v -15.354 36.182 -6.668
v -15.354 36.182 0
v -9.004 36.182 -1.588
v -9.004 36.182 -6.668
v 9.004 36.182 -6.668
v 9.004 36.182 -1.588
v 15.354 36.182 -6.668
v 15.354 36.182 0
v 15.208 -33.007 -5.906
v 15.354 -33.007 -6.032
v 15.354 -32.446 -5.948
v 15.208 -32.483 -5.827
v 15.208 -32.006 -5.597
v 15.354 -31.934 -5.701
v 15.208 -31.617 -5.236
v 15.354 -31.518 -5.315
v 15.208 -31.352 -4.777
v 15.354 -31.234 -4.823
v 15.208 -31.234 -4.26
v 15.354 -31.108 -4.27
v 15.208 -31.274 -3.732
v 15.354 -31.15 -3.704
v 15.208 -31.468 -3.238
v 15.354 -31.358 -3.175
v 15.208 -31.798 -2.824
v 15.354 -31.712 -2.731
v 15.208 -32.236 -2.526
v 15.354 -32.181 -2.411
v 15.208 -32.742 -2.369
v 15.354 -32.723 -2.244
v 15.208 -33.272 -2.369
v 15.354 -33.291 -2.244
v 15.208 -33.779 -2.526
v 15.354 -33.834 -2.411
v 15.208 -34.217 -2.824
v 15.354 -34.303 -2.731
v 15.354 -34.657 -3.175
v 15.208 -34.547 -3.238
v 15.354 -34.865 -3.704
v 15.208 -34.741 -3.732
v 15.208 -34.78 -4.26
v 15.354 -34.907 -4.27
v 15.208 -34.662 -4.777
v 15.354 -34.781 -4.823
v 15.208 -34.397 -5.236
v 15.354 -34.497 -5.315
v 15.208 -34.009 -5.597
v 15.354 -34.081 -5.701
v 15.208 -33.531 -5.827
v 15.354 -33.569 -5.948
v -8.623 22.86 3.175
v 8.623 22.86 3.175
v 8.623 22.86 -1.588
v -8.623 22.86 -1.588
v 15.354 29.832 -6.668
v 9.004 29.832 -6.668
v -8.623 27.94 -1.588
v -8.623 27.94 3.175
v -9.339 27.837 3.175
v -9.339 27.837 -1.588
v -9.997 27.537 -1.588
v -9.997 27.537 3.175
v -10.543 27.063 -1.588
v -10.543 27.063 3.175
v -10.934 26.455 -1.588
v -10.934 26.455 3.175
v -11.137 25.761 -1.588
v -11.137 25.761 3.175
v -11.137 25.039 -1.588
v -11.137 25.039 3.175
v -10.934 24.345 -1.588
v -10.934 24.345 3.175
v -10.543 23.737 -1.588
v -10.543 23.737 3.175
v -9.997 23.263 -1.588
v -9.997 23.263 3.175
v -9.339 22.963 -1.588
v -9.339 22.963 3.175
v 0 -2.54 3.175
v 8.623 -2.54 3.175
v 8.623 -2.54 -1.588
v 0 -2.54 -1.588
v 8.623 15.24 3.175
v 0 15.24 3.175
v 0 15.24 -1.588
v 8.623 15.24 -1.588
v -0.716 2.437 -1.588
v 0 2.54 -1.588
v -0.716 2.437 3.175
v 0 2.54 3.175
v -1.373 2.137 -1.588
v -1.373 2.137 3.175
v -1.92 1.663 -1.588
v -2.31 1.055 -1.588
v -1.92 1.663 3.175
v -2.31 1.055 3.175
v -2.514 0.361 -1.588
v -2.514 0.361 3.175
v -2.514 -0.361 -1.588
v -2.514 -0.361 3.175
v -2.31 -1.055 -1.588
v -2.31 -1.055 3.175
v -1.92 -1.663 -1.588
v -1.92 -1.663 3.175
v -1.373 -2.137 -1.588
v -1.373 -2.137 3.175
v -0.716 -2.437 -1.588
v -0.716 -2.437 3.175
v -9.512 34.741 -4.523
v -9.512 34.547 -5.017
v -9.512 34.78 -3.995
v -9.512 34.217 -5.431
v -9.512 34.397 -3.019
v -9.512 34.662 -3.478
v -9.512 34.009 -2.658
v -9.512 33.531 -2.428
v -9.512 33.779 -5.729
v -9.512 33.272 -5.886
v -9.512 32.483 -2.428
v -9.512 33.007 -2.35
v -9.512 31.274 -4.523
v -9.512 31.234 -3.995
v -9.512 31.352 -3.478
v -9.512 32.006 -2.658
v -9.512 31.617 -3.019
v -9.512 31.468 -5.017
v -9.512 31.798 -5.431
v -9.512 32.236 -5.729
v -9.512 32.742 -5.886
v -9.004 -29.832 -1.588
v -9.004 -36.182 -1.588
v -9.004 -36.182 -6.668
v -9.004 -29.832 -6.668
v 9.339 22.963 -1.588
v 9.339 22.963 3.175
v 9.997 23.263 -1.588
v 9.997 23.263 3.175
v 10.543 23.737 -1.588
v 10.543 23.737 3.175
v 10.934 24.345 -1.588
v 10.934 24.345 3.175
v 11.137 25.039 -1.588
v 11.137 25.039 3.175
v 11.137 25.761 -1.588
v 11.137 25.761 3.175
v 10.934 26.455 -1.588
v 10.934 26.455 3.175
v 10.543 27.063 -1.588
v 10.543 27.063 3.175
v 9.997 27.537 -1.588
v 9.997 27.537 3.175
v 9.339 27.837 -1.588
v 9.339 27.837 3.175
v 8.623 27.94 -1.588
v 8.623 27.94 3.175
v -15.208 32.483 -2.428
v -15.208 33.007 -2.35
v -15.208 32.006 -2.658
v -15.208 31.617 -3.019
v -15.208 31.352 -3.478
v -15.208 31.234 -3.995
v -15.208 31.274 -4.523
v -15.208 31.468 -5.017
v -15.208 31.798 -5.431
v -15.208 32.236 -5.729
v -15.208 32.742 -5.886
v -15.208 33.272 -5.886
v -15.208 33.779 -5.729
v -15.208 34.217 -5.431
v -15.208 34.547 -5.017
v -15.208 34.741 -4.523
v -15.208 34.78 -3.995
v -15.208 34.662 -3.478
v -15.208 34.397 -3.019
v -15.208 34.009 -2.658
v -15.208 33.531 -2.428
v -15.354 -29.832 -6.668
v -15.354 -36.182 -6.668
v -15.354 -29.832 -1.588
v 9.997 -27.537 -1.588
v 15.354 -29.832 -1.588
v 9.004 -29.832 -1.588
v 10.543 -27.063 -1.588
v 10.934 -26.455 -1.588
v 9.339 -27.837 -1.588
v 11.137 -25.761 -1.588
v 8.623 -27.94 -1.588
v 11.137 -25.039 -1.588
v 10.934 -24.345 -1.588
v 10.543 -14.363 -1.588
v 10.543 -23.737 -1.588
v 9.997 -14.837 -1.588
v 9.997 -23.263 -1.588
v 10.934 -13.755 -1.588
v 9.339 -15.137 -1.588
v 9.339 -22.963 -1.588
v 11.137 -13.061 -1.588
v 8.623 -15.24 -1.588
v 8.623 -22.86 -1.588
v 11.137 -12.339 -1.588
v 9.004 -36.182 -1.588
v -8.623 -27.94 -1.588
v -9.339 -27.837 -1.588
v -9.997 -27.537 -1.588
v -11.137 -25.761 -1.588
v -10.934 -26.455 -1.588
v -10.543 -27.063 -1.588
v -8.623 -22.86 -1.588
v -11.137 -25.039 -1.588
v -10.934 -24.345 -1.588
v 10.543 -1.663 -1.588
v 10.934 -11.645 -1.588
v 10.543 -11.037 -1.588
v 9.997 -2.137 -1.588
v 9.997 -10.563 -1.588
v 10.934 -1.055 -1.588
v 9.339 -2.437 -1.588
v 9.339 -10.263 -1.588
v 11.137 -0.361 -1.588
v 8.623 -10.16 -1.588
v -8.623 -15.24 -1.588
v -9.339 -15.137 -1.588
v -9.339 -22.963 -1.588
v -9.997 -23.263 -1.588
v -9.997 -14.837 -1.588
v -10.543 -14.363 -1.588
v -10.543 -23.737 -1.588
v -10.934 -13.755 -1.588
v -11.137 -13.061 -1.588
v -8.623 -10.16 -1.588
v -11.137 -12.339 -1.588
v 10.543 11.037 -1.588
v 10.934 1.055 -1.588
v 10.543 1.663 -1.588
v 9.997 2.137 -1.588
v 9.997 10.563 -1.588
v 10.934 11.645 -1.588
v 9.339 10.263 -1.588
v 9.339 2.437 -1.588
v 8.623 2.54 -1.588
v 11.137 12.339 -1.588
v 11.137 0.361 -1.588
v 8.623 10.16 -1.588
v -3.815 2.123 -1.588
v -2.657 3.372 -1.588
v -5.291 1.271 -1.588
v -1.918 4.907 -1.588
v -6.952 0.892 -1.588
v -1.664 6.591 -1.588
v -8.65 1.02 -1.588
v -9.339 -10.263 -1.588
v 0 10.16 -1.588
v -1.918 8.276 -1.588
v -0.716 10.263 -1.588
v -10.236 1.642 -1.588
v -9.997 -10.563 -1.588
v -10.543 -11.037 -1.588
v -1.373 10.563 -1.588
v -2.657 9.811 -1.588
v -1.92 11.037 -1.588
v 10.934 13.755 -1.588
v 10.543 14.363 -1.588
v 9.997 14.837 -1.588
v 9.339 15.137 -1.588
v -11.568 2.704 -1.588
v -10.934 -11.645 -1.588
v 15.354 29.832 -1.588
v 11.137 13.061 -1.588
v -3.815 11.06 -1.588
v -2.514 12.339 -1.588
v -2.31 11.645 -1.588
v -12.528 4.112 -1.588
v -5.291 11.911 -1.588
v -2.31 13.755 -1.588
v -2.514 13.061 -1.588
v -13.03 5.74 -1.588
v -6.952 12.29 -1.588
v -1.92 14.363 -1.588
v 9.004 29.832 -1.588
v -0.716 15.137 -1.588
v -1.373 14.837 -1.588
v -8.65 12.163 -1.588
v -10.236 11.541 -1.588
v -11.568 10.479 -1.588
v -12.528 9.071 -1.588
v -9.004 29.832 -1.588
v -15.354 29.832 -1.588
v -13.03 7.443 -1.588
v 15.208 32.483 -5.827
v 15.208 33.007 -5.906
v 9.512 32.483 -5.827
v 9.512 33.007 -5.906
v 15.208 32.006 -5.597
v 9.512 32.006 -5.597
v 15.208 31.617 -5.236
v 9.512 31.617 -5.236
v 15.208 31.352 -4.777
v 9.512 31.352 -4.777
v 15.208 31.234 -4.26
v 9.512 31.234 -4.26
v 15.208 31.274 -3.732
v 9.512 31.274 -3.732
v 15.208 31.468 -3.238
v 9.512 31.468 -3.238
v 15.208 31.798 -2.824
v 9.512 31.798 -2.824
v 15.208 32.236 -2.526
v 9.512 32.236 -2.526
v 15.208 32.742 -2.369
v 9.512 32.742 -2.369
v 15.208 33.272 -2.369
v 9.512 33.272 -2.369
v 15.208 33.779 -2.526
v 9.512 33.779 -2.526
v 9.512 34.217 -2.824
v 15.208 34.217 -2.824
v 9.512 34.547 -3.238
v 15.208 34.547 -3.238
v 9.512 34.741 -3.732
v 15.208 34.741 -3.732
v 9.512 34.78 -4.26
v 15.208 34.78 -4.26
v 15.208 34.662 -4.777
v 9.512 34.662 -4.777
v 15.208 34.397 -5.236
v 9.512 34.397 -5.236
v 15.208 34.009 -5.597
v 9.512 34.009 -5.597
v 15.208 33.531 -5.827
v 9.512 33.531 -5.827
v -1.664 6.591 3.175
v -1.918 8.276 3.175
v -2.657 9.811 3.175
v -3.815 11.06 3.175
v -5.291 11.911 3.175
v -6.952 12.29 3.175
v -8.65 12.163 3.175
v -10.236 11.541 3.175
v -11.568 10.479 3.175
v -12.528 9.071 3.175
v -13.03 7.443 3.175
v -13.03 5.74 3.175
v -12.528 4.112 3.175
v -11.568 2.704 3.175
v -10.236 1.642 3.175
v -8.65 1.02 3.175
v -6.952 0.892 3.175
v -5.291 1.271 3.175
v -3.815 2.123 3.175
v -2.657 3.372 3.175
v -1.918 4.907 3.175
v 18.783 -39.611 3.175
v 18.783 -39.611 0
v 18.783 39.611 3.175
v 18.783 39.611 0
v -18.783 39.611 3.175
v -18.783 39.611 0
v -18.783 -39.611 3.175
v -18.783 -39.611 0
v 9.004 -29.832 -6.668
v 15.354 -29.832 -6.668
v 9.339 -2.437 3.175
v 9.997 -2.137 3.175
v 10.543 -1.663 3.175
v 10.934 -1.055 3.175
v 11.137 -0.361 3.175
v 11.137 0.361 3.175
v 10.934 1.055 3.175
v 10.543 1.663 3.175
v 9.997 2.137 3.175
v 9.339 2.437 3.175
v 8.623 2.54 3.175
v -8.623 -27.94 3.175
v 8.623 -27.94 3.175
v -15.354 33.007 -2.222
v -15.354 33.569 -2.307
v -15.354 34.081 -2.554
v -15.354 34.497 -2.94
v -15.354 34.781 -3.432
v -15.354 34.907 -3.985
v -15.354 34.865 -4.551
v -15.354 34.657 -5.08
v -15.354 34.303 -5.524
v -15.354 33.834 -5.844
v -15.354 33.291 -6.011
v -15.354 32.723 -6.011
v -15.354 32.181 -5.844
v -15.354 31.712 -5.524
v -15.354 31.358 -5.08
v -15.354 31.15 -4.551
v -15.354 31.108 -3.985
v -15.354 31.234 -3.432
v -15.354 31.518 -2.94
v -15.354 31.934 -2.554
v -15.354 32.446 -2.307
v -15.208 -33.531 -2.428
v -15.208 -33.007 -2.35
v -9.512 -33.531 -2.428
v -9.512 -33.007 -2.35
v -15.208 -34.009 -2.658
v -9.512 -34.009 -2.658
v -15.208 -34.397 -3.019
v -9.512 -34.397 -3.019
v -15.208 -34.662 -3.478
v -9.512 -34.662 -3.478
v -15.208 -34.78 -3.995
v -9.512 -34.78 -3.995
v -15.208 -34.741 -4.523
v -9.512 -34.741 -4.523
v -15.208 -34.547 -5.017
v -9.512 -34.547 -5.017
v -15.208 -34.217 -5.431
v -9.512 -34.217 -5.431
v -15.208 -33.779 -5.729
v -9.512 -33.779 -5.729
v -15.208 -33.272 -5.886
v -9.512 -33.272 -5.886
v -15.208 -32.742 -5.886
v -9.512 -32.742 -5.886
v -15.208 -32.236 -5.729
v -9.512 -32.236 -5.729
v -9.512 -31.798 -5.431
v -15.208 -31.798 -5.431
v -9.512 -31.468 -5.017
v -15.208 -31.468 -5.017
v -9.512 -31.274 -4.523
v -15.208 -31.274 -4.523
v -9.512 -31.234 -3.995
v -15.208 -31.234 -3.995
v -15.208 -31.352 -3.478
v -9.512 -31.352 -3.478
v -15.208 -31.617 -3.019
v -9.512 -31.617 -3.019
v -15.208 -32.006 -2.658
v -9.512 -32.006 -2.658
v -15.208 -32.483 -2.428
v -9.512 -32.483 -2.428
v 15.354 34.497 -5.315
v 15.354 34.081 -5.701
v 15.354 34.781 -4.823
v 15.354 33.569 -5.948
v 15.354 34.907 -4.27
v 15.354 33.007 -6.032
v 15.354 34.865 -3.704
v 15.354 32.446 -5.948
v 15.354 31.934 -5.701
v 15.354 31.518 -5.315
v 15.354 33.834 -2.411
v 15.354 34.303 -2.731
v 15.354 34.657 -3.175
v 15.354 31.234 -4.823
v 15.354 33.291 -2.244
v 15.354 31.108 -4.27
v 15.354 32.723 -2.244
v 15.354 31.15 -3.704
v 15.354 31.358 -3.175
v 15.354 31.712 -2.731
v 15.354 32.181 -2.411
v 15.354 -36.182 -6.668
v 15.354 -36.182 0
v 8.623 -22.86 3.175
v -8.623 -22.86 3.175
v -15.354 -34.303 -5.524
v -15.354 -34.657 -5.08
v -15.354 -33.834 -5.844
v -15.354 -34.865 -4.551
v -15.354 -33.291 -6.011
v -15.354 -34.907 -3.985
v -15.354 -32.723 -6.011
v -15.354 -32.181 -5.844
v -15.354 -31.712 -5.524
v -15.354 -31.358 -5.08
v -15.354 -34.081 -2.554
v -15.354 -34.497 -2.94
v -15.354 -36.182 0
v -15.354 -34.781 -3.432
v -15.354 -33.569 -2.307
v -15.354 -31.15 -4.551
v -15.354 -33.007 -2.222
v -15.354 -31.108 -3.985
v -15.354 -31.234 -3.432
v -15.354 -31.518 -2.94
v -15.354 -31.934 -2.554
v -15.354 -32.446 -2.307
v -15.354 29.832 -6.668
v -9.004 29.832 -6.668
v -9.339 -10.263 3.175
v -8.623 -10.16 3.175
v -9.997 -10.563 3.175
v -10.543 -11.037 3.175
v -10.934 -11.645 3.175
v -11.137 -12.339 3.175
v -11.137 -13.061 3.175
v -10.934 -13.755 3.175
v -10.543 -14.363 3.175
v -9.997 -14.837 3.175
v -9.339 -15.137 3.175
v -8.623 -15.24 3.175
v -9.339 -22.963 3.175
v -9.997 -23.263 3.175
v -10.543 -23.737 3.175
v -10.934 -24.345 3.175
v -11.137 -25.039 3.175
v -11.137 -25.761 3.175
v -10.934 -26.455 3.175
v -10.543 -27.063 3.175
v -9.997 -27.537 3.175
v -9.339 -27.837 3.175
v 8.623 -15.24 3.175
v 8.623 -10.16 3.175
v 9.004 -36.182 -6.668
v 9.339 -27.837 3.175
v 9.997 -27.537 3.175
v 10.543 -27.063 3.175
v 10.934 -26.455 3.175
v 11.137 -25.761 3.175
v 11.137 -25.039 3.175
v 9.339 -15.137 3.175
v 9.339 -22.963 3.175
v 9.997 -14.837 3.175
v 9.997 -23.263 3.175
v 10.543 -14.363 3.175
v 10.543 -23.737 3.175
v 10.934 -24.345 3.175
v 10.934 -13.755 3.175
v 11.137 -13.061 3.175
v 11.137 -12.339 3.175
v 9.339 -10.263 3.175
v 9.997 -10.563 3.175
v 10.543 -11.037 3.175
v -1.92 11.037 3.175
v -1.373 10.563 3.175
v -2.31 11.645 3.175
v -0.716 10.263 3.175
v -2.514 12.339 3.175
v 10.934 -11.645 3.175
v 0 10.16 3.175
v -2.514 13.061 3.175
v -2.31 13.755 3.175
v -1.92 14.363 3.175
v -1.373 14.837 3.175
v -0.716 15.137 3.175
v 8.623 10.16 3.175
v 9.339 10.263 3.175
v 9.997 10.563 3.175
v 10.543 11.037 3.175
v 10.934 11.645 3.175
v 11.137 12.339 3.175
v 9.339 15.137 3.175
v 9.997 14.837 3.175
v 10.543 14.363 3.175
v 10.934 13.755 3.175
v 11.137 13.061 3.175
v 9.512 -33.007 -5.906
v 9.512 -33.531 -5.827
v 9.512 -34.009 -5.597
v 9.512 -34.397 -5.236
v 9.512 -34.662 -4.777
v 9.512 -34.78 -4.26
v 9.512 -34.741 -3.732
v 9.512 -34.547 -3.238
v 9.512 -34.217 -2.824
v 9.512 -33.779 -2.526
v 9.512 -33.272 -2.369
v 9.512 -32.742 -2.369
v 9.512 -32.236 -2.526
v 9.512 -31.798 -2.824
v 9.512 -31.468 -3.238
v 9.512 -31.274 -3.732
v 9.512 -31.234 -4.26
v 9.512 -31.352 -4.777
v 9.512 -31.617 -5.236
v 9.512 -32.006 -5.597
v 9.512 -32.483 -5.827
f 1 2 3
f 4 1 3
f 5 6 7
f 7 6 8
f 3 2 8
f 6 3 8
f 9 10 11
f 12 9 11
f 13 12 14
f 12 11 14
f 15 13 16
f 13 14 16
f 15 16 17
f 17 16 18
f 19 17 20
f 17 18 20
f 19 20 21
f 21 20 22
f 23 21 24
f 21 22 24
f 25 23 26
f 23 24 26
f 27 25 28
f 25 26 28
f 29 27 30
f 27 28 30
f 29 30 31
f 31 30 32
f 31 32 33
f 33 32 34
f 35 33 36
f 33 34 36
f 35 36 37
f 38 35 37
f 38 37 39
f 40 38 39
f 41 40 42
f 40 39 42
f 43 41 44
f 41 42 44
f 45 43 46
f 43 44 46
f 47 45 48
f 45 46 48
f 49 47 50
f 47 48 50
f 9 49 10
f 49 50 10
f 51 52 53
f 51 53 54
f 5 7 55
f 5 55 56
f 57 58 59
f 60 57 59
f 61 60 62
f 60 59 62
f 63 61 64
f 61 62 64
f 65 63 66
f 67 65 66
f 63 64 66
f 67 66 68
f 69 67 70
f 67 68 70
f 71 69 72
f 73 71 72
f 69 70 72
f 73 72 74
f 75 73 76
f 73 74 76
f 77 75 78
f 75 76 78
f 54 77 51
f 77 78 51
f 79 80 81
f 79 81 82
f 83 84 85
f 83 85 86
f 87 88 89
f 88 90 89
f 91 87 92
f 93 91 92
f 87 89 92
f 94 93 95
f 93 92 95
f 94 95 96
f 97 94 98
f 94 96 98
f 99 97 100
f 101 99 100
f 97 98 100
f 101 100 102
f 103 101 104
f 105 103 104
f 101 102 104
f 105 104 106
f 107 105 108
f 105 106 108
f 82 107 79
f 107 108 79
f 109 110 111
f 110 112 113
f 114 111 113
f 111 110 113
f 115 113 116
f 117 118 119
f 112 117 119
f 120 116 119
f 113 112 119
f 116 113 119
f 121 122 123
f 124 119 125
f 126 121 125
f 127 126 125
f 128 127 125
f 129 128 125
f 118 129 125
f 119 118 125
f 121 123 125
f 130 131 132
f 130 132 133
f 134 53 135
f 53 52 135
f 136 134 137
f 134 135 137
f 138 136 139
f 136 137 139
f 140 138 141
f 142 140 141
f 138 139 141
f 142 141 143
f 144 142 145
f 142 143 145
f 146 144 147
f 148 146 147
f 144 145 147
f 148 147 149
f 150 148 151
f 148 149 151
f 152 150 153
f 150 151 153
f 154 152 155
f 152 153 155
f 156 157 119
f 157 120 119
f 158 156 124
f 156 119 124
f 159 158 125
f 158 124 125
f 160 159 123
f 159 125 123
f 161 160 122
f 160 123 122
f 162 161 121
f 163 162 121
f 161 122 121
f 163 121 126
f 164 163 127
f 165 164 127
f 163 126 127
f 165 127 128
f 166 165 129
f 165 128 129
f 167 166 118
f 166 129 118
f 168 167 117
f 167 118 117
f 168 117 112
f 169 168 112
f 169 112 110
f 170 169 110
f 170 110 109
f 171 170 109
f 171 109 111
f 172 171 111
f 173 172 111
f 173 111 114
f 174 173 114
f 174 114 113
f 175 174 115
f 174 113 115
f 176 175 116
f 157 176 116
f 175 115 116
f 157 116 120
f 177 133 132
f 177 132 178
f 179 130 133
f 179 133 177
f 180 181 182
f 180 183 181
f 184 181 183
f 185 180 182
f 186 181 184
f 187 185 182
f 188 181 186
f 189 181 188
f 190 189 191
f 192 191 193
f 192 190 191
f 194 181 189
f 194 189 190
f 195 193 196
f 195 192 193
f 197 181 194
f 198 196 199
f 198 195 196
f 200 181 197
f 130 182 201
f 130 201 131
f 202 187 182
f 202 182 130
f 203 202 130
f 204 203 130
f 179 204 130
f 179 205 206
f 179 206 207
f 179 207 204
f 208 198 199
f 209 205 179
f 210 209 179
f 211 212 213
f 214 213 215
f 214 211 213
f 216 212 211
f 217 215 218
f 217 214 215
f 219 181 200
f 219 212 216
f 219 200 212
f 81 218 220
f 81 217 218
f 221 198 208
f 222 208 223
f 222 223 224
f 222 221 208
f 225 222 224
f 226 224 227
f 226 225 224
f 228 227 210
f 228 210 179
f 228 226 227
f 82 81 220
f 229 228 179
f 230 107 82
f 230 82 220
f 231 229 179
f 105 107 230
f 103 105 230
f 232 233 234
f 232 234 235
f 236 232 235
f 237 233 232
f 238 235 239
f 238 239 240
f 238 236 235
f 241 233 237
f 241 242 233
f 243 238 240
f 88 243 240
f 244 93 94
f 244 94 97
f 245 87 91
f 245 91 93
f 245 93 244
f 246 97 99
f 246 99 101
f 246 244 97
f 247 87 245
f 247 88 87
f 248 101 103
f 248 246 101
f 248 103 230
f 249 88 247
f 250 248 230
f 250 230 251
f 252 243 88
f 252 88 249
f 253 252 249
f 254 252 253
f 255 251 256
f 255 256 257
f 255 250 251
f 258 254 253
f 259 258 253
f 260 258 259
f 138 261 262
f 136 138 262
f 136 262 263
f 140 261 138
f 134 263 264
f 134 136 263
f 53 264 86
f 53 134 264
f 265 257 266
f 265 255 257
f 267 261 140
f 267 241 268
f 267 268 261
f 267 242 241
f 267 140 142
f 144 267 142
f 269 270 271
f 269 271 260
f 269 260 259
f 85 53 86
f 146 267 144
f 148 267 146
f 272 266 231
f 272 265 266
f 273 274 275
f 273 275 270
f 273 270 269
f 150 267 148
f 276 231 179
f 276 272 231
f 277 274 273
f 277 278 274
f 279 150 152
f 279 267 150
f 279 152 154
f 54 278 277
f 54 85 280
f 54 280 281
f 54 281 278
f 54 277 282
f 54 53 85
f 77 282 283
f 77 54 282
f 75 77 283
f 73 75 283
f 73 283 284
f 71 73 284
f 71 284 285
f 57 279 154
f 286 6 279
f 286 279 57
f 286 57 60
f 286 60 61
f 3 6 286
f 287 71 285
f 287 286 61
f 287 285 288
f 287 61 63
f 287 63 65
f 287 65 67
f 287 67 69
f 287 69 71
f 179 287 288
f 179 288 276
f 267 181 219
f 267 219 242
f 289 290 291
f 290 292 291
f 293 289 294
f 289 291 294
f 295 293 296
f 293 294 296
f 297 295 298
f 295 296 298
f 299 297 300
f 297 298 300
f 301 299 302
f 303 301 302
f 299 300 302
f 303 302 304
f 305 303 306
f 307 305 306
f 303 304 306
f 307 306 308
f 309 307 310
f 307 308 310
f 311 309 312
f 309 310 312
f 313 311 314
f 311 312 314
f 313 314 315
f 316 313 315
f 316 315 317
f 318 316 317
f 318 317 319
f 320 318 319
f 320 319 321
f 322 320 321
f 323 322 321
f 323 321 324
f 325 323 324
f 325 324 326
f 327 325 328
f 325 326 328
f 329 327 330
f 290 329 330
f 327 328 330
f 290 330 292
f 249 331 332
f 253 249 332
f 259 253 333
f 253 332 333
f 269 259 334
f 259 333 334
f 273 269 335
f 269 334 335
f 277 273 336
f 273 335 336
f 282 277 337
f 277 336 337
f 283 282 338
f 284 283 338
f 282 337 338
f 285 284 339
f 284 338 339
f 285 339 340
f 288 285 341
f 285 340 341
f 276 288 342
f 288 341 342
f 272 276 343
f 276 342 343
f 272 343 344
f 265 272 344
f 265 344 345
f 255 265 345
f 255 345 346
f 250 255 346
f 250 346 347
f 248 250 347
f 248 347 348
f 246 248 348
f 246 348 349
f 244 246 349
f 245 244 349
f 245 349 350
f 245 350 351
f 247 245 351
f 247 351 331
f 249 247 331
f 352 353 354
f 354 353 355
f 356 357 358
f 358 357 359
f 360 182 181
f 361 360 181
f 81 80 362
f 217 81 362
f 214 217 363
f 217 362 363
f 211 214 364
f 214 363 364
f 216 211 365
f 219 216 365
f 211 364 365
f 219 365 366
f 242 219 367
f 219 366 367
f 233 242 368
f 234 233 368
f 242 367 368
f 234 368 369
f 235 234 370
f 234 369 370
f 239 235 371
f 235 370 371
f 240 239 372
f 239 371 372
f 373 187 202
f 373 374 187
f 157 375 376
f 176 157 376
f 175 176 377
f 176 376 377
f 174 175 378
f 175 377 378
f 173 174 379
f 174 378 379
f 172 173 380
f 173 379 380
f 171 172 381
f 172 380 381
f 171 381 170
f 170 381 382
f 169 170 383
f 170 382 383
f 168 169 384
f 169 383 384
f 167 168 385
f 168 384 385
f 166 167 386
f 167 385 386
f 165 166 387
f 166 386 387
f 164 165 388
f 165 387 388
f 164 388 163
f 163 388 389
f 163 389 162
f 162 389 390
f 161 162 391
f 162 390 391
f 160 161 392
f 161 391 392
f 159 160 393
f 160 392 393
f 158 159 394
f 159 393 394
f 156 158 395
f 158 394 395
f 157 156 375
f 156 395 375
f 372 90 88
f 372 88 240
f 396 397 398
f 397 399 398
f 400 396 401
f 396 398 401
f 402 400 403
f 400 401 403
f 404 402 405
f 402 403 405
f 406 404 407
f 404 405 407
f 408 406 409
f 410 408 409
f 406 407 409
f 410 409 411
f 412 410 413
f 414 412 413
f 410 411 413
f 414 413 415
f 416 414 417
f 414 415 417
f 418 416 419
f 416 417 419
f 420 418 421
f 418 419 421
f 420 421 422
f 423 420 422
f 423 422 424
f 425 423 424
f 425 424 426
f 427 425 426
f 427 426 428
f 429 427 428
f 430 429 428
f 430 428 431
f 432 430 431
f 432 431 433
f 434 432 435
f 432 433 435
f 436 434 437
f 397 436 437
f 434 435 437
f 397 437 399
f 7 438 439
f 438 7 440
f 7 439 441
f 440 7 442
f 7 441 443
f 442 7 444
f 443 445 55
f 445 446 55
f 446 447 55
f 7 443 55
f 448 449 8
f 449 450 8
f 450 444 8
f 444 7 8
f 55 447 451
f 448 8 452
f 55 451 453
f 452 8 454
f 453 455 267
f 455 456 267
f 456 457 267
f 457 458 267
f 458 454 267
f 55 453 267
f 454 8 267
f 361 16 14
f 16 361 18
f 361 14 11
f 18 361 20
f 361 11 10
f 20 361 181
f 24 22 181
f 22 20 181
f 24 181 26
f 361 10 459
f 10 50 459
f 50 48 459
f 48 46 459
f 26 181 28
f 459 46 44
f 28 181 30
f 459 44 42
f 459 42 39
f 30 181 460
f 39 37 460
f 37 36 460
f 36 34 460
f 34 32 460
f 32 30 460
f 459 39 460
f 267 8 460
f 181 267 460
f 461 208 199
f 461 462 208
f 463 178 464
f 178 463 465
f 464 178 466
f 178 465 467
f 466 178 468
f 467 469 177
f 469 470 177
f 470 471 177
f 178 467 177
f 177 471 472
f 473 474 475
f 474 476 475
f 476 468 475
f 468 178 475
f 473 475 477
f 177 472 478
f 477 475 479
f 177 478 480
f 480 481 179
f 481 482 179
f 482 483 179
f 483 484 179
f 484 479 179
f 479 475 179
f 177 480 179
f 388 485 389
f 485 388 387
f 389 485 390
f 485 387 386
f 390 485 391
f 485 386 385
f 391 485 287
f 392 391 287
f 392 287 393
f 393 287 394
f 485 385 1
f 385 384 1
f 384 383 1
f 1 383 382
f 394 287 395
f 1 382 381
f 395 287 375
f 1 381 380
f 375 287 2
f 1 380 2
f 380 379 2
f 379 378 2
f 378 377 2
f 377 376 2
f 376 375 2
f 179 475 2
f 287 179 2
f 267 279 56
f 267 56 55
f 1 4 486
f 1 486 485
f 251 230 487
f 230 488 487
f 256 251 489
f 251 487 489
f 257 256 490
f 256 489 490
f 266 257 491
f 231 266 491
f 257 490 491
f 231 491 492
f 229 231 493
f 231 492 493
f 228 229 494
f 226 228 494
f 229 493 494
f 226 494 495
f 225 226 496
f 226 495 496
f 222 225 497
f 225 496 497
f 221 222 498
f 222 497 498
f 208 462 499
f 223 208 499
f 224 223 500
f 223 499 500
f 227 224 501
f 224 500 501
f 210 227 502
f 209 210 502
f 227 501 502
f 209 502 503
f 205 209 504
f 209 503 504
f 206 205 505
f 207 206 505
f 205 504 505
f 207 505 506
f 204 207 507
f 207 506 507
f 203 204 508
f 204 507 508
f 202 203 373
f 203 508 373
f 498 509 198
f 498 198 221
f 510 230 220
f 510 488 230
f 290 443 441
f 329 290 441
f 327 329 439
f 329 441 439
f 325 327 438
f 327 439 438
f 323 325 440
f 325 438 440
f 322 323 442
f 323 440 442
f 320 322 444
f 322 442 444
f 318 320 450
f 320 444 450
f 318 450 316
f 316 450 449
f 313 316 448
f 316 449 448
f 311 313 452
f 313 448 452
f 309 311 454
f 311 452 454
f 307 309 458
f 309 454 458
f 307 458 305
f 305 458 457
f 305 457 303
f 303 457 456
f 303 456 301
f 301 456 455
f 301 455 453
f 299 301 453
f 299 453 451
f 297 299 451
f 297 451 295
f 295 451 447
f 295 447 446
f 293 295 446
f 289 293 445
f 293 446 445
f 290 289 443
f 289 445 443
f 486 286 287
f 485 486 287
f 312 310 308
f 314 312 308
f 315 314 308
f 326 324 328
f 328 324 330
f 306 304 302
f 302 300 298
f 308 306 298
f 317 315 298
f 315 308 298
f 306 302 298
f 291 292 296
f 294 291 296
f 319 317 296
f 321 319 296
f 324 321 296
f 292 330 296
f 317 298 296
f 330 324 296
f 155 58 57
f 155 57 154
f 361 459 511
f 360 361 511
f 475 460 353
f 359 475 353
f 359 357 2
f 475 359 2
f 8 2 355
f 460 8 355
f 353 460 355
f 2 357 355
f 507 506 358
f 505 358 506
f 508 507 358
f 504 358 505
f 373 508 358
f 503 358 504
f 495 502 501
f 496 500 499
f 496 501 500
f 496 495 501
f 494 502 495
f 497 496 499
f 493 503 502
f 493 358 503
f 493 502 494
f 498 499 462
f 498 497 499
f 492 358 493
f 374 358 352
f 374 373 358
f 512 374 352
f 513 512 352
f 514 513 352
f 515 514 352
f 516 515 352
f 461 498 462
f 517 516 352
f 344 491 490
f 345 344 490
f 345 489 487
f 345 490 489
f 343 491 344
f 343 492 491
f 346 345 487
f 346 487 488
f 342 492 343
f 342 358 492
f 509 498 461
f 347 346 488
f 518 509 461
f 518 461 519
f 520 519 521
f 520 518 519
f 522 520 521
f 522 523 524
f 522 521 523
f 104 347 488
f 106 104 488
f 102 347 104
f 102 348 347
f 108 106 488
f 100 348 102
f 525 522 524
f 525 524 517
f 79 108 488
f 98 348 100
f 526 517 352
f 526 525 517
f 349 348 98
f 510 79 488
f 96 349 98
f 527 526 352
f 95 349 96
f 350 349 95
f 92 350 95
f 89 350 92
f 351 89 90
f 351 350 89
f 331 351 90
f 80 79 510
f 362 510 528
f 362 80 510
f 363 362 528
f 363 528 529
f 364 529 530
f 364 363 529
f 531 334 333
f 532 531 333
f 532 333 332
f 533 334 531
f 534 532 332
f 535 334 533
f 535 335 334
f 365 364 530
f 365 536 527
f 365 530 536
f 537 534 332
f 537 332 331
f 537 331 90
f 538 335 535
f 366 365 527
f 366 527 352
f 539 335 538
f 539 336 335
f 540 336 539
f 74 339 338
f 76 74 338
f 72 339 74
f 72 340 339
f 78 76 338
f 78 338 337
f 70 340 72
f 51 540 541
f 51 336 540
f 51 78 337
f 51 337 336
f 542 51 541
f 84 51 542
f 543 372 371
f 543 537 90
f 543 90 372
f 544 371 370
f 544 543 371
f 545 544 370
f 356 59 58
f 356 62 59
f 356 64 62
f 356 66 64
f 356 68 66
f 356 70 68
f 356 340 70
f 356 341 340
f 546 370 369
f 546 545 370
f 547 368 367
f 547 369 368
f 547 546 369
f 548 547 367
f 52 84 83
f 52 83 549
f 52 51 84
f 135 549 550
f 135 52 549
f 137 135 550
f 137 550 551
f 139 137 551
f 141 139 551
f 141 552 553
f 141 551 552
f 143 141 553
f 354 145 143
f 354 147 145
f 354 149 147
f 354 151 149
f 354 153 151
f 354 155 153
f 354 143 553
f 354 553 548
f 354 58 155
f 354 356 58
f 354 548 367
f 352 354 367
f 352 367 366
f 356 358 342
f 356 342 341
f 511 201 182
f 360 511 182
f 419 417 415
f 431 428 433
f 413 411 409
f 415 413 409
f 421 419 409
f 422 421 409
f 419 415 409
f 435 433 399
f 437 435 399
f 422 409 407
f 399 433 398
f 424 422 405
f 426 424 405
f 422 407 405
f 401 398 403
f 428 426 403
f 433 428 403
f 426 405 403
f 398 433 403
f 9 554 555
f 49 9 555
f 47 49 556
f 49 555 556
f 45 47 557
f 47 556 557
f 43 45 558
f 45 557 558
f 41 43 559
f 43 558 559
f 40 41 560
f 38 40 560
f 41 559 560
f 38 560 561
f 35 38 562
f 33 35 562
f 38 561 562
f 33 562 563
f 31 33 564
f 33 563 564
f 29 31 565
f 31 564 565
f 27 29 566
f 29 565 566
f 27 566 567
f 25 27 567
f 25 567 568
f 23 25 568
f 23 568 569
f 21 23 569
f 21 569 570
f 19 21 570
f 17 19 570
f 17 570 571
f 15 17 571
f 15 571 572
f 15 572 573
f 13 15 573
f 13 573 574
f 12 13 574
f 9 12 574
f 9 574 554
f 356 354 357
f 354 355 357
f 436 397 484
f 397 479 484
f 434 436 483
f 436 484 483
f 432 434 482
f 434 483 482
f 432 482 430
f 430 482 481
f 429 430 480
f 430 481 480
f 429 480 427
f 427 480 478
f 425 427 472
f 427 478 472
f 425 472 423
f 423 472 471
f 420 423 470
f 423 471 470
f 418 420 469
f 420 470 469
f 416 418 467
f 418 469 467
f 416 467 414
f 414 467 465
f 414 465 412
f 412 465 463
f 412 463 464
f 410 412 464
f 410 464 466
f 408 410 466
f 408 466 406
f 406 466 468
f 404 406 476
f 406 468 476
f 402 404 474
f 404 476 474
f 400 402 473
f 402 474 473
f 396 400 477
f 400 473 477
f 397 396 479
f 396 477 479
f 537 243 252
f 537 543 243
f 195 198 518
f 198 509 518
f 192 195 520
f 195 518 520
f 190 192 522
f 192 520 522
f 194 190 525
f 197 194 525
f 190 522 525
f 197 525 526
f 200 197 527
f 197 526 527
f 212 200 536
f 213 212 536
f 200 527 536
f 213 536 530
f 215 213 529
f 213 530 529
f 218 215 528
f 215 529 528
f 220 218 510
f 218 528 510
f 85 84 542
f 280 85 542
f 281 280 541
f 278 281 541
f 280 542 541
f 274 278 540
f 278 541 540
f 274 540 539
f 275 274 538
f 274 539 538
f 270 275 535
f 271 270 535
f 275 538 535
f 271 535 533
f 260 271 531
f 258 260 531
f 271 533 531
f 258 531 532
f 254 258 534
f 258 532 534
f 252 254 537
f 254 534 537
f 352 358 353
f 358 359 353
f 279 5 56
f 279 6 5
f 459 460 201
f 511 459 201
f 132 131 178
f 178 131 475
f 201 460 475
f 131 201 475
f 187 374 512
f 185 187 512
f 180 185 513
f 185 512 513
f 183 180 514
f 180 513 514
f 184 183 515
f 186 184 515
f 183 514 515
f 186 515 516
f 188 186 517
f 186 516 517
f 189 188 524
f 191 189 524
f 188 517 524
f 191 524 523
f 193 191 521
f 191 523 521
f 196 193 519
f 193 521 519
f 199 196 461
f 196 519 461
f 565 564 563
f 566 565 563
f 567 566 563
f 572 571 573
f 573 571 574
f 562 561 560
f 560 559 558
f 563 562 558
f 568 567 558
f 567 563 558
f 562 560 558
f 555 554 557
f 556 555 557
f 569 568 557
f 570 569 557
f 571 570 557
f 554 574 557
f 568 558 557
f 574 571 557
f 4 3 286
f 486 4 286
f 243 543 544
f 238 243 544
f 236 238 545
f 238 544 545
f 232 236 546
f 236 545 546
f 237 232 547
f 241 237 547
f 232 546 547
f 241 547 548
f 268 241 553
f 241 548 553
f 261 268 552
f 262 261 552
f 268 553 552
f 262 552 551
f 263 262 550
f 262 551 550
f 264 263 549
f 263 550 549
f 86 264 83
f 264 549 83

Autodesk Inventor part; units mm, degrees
ref_plane "YZ Plane" through (0, 0, 0) normal (1, 0, 0) x (0, 1, 0)
ref_plane "XZ Plane" through (0, 0, 0) normal (0, 1, 0) x (-1, 0, 0)
ref_plane "XY Plane" through (0, 0, 0) normal (0, 0, 1) x (1, 0, 0)
sketch "Sketch1" plane through (0, 0, 0) normal (0, 0, 1) x (1, 0, 0)
  line L0 (-18.7833, 39.6114) -> (-18.7833, -39.6114) projected
  line L1 (-18.7833, -39.6114) -> (18.7833, -39.6114) projected
  line L2 (18.7833, -39.6114) -> (18.7833, 39.6114) projected
  line L3 (18.7833, 39.6114) -> (-18.7833, 39.6114) projected
  line L4 (-15.6083, 36.4364) -> (15.6083, 36.4364) projected
  line L5 (15.6083, 36.4364) -> (15.6083, -36.4364) projected
  line L6 (15.6083, -36.4364) -> (-15.6083, -36.4364) projected
  line L7 (-15.6083, -36.4364) -> (-15.6083, 36.4364) projected
  point P0 (0, 0)
extrude "Extrusion1" add sketch "Sketch1" along normal blind 3.175 contours L3 L2 L1 L0 | L4 L5 L6 L7
sketch "Sketch2" plane through (0, 0, 0) normal (0, 0, -1) x (-1, 0, 0)
  line L0 (-15.6083, -36.4364) -> (15.6083, -36.4364) projected
  line L1 (-15.6083, 36.4364) -> (-15.6083, -36.4364) projected
  line L2 (15.6083, 36.4364) -> (-15.6083, 36.4364) projected
  line L3 (15.6083, -36.4364) -> (15.6083, 36.4364) projected
  line L4 (-15.3543, 36.1824) -> (-15.3543, -36.1824)
  line L5 (-15.3543, -36.1824) -> (15.3543, -36.1824)
  line L6 (15.3543, -36.1824) -> (15.3543, 36.1824)
  line L7 (15.3543, 36.1824) -> (-15.3543, 36.1824)
  point P0 (0, 0)
  dimension "d2" = 0.254
extrude "Extrusion2" add sketch "Sketch2" along normal blind 1.5875 contours L7 L6 L5 L4
sketch "Sketch3" plane through (0, 0, -1.5875) normal (0, 0, -1) x (-1, 0, 0)
  line L0 (-15.3543, 36.1824) -> (-15.3543, -36.1824) projected
  line L1 (-15.3543, 36.1824) -> (-9.0043, 36.1824)
  line L2 (-9.0043, 36.1824) -> (-9.0043, 29.8324)
  line L3 (-9.0043, 29.8324) -> (-15.3543, 29.8324)
  line L4 (-15.3543, 29.8324) -> (-15.3543, 36.1824)
  line L5 (15.3543, 36.1824) -> (-15.3543, 36.1824) projected
  line L6 (15.3543, 36.1824) -> (9.0043, 36.1824)
  line L7 (9.0043, 36.1824) -> (9.0043, 29.8324)
  line L8 (9.0043, 29.8324) -> (15.3543, 29.8324)
  line L9 (15.3543, 29.8324) -> (15.3543, 36.1824)
  line L10 (-15.3543, -36.1824) -> (15.3543, -36.1824) projected
  line L11 (-15.3543, -36.1824) -> (-9.0043, -36.1824)
  line L12 (-9.0043, -36.1824) -> (-9.0043, -29.8324)
  line L13 (-9.0043, -29.8324) -> (-15.3543, -29.8324)
  line L14 (-15.3543, -29.8324) -> (-15.3543, -36.1824)
  line L15 (15.3543, 36.1824) -> (15.3543, -36.1824) projected
  line L16 (15.3543, -36.1824) -> (9.0043, -36.1824)
  line L17 (9.0043, -36.1824) -> (9.0043, -29.8324)
  line L18 (9.0043, -29.8324) -> (15.3543, -29.8324)
  line L19 (15.3543, -29.8324) -> (15.3543, -36.1824)
  point P0 (0, 0)
  dimension "d5" = 6.35
  dimension "d6" = 6.35
  dimension "d7" = 6.35
  dimension "d8" = 6.35
  dimension "d9" = 6.35
  dimension "d10" = 6.35
  dimension "d11" = 6.35
  dimension "d12" = 6.35
extrude "Extrusion3" add sketch "Sketch3" along normal blind 5.08 contours L1 L2 L3 L0 | L13 L12 L10 L0 | L5 L9 L8 L7 | L17 L18 L15 L10
sketch "Sketch4" plane through (15.3543, -36.1824, 0) normal (1, 0, 0) x (0, 0, -1)
  line L0 (6.6675, 66.0147) -> (6.6675, 72.3647) projected
  line L1 (0, 72.3647) -> (0, 0) projected
  line L2 (6.6675, 0) -> (6.6675, 6.35) projected
  line L3 (1.5875, 66.0147) -> (1.5875, 6.35) projected
  line L4 (0, 72.3647) -> (6.6675, 72.3647) projected
  line L5 (1.5875, 6.35) -> (6.6675, 6.35) projected
  line L6 (6.6675, 6.35) -> (6.6675, 0) projected
  line L7 (1.5875, 6.35) -> (6.6675, 0)
  line L8 (1.5875, 66.0147) -> (6.6675, 72.3647)
  point P0 (0, 36.1824)
  point P1 (4.1275, 3.175)
  point P2 (4.1275, 69.1897)
  point P3 (4.1275, 3.175)
  point P4 (4.1275, 69.1897)
sketch "Sketch5" plane through (-15.3543, -36.1824, 0) normal (-1, 0, 0) x (0, 0, 1)
  point P0 (0, 36.1824)
  point P1 (-4.1275, 69.1897)
  point P2 (-4.1275, 3.175)
hole "Hole1" at (15.3543, 33.0074, -4.1275) at (15.3543, -33.0074, -4.1275) direction (-1, 0, 0) diameter 3.556 depth 5.842 countersink diameter 3.81 countersink angle 82
hole "Hole2" at (-15.3543, 33.0074, -4.1275) at (-15.3543, -33.0074, -4.1275) direction (1, 0, 0) diameter 3.556 depth 5.842 countersink diameter 3.81 countersink angle 82
sketch "Sketch6" plane through (0, 0, 3.175) normal (0, 0, 1) x (1, 0, 0)
  line L0 (-8.6233, 0) -> (8.6233, 0) construction
  line L1 (-8.6233, 2.54) -> (8.6233, 2.54)
  line L2 (8.6233, -2.54) -> (-8.6233, -2.54)
  arc A0 (-8.6233, 2.54) -> (-8.6233, -2.54) centre (-8.6233, 0) ccw
  arc A1 (8.6233, -2.54) -> (8.6233, 2.54) centre (8.6233, 0) ccw
  line L3 (-18.7833, 39.6114) -> (-18.7833, -39.6114) projected
  line L4 (18.7833, -39.6114) -> (18.7833, 39.6114) projected
  line L5 (-18.7833, -39.6114) -> (18.7833, -39.6114) projected
  arc A2 (8.6233, 10.16) -> (8.6233, 15.24) centre (8.6233, 12.7) ccw
  line L6 (-8.6233, 15.24) -> (8.6233, 15.24)
  line L7 (8.6233, 10.16) -> (-8.6233, 10.16)
  arc A3 (-8.6233, 15.24) -> (-8.6233, 10.16) centre (-8.6233, 12.7) ccw
  arc A4 (8.6233, 22.86) -> (8.6233, 27.94) centre (8.6233, 25.4) ccw
  line L8 (-8.6233, 27.94) -> (8.6233, 27.94)
  line L9 (8.6233, 22.86) -> (-8.6233, 22.86)
  arc A5 (-8.6233, 27.94) -> (-8.6233, 22.86) centre (-8.6233, 25.4) ccw
  arc A6 (8.6233, -15.24) -> (8.6233, -10.16) centre (8.6233, -12.7) ccw
  line L10 (-8.6233, -10.16) -> (8.6233, -10.16)
  line L11 (8.6233, -15.24) -> (-8.6233, -15.24)
  arc A7 (-8.6233, -10.16) -> (-8.6233, -15.24) centre (-8.6233, -12.7) ccw
  arc A8 (8.6233, -2.54) -> (8.6233, 2.54) centre (8.6233, 0) ccw
  line L12 (-8.6233, 2.54) -> (8.6233, 2.54)
  line L13 (8.6233, -2.54) -> (-8.6233, -2.54)
  arc A9 (-8.6233, 2.54) -> (-8.6233, -2.54) centre (-8.6233, 0) ccw
  arc A10 (8.6233, 10.16) -> (8.6233, 15.24) centre (8.6233, 12.7) ccw
  line L14 (-8.6233, 15.24) -> (8.6233, 15.24)
  line L15 (8.6233, 10.16) -> (-8.6233, 10.16)
  arc A11 (-8.6233, 15.24) -> (-8.6233, 10.16) centre (-8.6233, 12.7) ccw
  arc A12 (8.6233, -27.94) -> (8.6233, -22.86) centre (8.6233, -25.4) ccw
  line L16 (-8.6233, -22.86) -> (8.6233, -22.86)
  line L17 (8.6233, -27.94) -> (-8.6233, -27.94)
  arc A13 (-8.6233, -22.86) -> (-8.6233, -27.94) centre (-8.6233, -25.4) ccw
  arc A14 (8.6233, -15.24) -> (8.6233, -10.16) centre (8.6233, -12.7) ccw
  line L18 (-8.6233, -10.16) -> (8.6233, -10.16)
  line L19 (8.6233, -15.24) -> (-8.6233, -15.24)
  arc A15 (-8.6233, -10.16) -> (-8.6233, -15.24) centre (-8.6233, -12.7) ccw
  arc A16 (8.6233, -2.54) -> (8.6233, 2.54) centre (8.6233, 0) ccw
  line L20 (-8.6233, 2.54) -> (8.6233, 2.54)
  line L21 (8.6233, -2.54) -> (-8.6233, -2.54)
  arc A17 (-8.6233, 2.54) -> (-8.6233, -2.54) centre (-8.6233, 0) ccw
  circle A18 centre (0, 12.7) radius 2.54
  circle A19 centre (0, 0) radius 2.54
  point P0 (0, 0)
  point P1 (0, 10.16)
  point P2 (0, 15.24)
  point P3 (0, 2.54)
  point P4 (0, -2.54)
  dimension "d29" = 10.16
  dimension "d30" = 10.16
  dimension "d31" = 2.54
  dimension "d35" = 12.7
  dimension "d38" = 12.7
extrude "Extrusion4" cut sketch "Sketch6" against normal up to surface (4.7625 mm away) contours L1 A1 L2 A19 | A19 | L7 A18 L6 A2 | A18 | L9 A5 L8 A4 | L11 A7 L10 A6 | L17 A13 L16 A12
sketch "Sketch7" plane through (0, 0, 3.175) normal (0, 0, 1) x (1, 0, 0)
  circle A0 centre (-7.3787, 6.5914) radius 5.715
  line L0 (18.7833, 39.6114) -> (-18.7833, 39.6114) projected
  line L1 (-18.7833, 39.6114) -> (-18.7833, -39.6114) projected
  line L2 (18.7833, -39.6114) -> (18.7833, 39.6114) projected
  point P0 (0, 0)
  dimension "d43" = 11.43
  dimension "d44" = 33.02
  dimension "d46" = 26.162
extrude "Extrusion5" cut sketch "Sketch7" against normal up to surface (4.7625 mm away)
properties part number "SENSOR_TOP" material "PC/ABS Plastic"
